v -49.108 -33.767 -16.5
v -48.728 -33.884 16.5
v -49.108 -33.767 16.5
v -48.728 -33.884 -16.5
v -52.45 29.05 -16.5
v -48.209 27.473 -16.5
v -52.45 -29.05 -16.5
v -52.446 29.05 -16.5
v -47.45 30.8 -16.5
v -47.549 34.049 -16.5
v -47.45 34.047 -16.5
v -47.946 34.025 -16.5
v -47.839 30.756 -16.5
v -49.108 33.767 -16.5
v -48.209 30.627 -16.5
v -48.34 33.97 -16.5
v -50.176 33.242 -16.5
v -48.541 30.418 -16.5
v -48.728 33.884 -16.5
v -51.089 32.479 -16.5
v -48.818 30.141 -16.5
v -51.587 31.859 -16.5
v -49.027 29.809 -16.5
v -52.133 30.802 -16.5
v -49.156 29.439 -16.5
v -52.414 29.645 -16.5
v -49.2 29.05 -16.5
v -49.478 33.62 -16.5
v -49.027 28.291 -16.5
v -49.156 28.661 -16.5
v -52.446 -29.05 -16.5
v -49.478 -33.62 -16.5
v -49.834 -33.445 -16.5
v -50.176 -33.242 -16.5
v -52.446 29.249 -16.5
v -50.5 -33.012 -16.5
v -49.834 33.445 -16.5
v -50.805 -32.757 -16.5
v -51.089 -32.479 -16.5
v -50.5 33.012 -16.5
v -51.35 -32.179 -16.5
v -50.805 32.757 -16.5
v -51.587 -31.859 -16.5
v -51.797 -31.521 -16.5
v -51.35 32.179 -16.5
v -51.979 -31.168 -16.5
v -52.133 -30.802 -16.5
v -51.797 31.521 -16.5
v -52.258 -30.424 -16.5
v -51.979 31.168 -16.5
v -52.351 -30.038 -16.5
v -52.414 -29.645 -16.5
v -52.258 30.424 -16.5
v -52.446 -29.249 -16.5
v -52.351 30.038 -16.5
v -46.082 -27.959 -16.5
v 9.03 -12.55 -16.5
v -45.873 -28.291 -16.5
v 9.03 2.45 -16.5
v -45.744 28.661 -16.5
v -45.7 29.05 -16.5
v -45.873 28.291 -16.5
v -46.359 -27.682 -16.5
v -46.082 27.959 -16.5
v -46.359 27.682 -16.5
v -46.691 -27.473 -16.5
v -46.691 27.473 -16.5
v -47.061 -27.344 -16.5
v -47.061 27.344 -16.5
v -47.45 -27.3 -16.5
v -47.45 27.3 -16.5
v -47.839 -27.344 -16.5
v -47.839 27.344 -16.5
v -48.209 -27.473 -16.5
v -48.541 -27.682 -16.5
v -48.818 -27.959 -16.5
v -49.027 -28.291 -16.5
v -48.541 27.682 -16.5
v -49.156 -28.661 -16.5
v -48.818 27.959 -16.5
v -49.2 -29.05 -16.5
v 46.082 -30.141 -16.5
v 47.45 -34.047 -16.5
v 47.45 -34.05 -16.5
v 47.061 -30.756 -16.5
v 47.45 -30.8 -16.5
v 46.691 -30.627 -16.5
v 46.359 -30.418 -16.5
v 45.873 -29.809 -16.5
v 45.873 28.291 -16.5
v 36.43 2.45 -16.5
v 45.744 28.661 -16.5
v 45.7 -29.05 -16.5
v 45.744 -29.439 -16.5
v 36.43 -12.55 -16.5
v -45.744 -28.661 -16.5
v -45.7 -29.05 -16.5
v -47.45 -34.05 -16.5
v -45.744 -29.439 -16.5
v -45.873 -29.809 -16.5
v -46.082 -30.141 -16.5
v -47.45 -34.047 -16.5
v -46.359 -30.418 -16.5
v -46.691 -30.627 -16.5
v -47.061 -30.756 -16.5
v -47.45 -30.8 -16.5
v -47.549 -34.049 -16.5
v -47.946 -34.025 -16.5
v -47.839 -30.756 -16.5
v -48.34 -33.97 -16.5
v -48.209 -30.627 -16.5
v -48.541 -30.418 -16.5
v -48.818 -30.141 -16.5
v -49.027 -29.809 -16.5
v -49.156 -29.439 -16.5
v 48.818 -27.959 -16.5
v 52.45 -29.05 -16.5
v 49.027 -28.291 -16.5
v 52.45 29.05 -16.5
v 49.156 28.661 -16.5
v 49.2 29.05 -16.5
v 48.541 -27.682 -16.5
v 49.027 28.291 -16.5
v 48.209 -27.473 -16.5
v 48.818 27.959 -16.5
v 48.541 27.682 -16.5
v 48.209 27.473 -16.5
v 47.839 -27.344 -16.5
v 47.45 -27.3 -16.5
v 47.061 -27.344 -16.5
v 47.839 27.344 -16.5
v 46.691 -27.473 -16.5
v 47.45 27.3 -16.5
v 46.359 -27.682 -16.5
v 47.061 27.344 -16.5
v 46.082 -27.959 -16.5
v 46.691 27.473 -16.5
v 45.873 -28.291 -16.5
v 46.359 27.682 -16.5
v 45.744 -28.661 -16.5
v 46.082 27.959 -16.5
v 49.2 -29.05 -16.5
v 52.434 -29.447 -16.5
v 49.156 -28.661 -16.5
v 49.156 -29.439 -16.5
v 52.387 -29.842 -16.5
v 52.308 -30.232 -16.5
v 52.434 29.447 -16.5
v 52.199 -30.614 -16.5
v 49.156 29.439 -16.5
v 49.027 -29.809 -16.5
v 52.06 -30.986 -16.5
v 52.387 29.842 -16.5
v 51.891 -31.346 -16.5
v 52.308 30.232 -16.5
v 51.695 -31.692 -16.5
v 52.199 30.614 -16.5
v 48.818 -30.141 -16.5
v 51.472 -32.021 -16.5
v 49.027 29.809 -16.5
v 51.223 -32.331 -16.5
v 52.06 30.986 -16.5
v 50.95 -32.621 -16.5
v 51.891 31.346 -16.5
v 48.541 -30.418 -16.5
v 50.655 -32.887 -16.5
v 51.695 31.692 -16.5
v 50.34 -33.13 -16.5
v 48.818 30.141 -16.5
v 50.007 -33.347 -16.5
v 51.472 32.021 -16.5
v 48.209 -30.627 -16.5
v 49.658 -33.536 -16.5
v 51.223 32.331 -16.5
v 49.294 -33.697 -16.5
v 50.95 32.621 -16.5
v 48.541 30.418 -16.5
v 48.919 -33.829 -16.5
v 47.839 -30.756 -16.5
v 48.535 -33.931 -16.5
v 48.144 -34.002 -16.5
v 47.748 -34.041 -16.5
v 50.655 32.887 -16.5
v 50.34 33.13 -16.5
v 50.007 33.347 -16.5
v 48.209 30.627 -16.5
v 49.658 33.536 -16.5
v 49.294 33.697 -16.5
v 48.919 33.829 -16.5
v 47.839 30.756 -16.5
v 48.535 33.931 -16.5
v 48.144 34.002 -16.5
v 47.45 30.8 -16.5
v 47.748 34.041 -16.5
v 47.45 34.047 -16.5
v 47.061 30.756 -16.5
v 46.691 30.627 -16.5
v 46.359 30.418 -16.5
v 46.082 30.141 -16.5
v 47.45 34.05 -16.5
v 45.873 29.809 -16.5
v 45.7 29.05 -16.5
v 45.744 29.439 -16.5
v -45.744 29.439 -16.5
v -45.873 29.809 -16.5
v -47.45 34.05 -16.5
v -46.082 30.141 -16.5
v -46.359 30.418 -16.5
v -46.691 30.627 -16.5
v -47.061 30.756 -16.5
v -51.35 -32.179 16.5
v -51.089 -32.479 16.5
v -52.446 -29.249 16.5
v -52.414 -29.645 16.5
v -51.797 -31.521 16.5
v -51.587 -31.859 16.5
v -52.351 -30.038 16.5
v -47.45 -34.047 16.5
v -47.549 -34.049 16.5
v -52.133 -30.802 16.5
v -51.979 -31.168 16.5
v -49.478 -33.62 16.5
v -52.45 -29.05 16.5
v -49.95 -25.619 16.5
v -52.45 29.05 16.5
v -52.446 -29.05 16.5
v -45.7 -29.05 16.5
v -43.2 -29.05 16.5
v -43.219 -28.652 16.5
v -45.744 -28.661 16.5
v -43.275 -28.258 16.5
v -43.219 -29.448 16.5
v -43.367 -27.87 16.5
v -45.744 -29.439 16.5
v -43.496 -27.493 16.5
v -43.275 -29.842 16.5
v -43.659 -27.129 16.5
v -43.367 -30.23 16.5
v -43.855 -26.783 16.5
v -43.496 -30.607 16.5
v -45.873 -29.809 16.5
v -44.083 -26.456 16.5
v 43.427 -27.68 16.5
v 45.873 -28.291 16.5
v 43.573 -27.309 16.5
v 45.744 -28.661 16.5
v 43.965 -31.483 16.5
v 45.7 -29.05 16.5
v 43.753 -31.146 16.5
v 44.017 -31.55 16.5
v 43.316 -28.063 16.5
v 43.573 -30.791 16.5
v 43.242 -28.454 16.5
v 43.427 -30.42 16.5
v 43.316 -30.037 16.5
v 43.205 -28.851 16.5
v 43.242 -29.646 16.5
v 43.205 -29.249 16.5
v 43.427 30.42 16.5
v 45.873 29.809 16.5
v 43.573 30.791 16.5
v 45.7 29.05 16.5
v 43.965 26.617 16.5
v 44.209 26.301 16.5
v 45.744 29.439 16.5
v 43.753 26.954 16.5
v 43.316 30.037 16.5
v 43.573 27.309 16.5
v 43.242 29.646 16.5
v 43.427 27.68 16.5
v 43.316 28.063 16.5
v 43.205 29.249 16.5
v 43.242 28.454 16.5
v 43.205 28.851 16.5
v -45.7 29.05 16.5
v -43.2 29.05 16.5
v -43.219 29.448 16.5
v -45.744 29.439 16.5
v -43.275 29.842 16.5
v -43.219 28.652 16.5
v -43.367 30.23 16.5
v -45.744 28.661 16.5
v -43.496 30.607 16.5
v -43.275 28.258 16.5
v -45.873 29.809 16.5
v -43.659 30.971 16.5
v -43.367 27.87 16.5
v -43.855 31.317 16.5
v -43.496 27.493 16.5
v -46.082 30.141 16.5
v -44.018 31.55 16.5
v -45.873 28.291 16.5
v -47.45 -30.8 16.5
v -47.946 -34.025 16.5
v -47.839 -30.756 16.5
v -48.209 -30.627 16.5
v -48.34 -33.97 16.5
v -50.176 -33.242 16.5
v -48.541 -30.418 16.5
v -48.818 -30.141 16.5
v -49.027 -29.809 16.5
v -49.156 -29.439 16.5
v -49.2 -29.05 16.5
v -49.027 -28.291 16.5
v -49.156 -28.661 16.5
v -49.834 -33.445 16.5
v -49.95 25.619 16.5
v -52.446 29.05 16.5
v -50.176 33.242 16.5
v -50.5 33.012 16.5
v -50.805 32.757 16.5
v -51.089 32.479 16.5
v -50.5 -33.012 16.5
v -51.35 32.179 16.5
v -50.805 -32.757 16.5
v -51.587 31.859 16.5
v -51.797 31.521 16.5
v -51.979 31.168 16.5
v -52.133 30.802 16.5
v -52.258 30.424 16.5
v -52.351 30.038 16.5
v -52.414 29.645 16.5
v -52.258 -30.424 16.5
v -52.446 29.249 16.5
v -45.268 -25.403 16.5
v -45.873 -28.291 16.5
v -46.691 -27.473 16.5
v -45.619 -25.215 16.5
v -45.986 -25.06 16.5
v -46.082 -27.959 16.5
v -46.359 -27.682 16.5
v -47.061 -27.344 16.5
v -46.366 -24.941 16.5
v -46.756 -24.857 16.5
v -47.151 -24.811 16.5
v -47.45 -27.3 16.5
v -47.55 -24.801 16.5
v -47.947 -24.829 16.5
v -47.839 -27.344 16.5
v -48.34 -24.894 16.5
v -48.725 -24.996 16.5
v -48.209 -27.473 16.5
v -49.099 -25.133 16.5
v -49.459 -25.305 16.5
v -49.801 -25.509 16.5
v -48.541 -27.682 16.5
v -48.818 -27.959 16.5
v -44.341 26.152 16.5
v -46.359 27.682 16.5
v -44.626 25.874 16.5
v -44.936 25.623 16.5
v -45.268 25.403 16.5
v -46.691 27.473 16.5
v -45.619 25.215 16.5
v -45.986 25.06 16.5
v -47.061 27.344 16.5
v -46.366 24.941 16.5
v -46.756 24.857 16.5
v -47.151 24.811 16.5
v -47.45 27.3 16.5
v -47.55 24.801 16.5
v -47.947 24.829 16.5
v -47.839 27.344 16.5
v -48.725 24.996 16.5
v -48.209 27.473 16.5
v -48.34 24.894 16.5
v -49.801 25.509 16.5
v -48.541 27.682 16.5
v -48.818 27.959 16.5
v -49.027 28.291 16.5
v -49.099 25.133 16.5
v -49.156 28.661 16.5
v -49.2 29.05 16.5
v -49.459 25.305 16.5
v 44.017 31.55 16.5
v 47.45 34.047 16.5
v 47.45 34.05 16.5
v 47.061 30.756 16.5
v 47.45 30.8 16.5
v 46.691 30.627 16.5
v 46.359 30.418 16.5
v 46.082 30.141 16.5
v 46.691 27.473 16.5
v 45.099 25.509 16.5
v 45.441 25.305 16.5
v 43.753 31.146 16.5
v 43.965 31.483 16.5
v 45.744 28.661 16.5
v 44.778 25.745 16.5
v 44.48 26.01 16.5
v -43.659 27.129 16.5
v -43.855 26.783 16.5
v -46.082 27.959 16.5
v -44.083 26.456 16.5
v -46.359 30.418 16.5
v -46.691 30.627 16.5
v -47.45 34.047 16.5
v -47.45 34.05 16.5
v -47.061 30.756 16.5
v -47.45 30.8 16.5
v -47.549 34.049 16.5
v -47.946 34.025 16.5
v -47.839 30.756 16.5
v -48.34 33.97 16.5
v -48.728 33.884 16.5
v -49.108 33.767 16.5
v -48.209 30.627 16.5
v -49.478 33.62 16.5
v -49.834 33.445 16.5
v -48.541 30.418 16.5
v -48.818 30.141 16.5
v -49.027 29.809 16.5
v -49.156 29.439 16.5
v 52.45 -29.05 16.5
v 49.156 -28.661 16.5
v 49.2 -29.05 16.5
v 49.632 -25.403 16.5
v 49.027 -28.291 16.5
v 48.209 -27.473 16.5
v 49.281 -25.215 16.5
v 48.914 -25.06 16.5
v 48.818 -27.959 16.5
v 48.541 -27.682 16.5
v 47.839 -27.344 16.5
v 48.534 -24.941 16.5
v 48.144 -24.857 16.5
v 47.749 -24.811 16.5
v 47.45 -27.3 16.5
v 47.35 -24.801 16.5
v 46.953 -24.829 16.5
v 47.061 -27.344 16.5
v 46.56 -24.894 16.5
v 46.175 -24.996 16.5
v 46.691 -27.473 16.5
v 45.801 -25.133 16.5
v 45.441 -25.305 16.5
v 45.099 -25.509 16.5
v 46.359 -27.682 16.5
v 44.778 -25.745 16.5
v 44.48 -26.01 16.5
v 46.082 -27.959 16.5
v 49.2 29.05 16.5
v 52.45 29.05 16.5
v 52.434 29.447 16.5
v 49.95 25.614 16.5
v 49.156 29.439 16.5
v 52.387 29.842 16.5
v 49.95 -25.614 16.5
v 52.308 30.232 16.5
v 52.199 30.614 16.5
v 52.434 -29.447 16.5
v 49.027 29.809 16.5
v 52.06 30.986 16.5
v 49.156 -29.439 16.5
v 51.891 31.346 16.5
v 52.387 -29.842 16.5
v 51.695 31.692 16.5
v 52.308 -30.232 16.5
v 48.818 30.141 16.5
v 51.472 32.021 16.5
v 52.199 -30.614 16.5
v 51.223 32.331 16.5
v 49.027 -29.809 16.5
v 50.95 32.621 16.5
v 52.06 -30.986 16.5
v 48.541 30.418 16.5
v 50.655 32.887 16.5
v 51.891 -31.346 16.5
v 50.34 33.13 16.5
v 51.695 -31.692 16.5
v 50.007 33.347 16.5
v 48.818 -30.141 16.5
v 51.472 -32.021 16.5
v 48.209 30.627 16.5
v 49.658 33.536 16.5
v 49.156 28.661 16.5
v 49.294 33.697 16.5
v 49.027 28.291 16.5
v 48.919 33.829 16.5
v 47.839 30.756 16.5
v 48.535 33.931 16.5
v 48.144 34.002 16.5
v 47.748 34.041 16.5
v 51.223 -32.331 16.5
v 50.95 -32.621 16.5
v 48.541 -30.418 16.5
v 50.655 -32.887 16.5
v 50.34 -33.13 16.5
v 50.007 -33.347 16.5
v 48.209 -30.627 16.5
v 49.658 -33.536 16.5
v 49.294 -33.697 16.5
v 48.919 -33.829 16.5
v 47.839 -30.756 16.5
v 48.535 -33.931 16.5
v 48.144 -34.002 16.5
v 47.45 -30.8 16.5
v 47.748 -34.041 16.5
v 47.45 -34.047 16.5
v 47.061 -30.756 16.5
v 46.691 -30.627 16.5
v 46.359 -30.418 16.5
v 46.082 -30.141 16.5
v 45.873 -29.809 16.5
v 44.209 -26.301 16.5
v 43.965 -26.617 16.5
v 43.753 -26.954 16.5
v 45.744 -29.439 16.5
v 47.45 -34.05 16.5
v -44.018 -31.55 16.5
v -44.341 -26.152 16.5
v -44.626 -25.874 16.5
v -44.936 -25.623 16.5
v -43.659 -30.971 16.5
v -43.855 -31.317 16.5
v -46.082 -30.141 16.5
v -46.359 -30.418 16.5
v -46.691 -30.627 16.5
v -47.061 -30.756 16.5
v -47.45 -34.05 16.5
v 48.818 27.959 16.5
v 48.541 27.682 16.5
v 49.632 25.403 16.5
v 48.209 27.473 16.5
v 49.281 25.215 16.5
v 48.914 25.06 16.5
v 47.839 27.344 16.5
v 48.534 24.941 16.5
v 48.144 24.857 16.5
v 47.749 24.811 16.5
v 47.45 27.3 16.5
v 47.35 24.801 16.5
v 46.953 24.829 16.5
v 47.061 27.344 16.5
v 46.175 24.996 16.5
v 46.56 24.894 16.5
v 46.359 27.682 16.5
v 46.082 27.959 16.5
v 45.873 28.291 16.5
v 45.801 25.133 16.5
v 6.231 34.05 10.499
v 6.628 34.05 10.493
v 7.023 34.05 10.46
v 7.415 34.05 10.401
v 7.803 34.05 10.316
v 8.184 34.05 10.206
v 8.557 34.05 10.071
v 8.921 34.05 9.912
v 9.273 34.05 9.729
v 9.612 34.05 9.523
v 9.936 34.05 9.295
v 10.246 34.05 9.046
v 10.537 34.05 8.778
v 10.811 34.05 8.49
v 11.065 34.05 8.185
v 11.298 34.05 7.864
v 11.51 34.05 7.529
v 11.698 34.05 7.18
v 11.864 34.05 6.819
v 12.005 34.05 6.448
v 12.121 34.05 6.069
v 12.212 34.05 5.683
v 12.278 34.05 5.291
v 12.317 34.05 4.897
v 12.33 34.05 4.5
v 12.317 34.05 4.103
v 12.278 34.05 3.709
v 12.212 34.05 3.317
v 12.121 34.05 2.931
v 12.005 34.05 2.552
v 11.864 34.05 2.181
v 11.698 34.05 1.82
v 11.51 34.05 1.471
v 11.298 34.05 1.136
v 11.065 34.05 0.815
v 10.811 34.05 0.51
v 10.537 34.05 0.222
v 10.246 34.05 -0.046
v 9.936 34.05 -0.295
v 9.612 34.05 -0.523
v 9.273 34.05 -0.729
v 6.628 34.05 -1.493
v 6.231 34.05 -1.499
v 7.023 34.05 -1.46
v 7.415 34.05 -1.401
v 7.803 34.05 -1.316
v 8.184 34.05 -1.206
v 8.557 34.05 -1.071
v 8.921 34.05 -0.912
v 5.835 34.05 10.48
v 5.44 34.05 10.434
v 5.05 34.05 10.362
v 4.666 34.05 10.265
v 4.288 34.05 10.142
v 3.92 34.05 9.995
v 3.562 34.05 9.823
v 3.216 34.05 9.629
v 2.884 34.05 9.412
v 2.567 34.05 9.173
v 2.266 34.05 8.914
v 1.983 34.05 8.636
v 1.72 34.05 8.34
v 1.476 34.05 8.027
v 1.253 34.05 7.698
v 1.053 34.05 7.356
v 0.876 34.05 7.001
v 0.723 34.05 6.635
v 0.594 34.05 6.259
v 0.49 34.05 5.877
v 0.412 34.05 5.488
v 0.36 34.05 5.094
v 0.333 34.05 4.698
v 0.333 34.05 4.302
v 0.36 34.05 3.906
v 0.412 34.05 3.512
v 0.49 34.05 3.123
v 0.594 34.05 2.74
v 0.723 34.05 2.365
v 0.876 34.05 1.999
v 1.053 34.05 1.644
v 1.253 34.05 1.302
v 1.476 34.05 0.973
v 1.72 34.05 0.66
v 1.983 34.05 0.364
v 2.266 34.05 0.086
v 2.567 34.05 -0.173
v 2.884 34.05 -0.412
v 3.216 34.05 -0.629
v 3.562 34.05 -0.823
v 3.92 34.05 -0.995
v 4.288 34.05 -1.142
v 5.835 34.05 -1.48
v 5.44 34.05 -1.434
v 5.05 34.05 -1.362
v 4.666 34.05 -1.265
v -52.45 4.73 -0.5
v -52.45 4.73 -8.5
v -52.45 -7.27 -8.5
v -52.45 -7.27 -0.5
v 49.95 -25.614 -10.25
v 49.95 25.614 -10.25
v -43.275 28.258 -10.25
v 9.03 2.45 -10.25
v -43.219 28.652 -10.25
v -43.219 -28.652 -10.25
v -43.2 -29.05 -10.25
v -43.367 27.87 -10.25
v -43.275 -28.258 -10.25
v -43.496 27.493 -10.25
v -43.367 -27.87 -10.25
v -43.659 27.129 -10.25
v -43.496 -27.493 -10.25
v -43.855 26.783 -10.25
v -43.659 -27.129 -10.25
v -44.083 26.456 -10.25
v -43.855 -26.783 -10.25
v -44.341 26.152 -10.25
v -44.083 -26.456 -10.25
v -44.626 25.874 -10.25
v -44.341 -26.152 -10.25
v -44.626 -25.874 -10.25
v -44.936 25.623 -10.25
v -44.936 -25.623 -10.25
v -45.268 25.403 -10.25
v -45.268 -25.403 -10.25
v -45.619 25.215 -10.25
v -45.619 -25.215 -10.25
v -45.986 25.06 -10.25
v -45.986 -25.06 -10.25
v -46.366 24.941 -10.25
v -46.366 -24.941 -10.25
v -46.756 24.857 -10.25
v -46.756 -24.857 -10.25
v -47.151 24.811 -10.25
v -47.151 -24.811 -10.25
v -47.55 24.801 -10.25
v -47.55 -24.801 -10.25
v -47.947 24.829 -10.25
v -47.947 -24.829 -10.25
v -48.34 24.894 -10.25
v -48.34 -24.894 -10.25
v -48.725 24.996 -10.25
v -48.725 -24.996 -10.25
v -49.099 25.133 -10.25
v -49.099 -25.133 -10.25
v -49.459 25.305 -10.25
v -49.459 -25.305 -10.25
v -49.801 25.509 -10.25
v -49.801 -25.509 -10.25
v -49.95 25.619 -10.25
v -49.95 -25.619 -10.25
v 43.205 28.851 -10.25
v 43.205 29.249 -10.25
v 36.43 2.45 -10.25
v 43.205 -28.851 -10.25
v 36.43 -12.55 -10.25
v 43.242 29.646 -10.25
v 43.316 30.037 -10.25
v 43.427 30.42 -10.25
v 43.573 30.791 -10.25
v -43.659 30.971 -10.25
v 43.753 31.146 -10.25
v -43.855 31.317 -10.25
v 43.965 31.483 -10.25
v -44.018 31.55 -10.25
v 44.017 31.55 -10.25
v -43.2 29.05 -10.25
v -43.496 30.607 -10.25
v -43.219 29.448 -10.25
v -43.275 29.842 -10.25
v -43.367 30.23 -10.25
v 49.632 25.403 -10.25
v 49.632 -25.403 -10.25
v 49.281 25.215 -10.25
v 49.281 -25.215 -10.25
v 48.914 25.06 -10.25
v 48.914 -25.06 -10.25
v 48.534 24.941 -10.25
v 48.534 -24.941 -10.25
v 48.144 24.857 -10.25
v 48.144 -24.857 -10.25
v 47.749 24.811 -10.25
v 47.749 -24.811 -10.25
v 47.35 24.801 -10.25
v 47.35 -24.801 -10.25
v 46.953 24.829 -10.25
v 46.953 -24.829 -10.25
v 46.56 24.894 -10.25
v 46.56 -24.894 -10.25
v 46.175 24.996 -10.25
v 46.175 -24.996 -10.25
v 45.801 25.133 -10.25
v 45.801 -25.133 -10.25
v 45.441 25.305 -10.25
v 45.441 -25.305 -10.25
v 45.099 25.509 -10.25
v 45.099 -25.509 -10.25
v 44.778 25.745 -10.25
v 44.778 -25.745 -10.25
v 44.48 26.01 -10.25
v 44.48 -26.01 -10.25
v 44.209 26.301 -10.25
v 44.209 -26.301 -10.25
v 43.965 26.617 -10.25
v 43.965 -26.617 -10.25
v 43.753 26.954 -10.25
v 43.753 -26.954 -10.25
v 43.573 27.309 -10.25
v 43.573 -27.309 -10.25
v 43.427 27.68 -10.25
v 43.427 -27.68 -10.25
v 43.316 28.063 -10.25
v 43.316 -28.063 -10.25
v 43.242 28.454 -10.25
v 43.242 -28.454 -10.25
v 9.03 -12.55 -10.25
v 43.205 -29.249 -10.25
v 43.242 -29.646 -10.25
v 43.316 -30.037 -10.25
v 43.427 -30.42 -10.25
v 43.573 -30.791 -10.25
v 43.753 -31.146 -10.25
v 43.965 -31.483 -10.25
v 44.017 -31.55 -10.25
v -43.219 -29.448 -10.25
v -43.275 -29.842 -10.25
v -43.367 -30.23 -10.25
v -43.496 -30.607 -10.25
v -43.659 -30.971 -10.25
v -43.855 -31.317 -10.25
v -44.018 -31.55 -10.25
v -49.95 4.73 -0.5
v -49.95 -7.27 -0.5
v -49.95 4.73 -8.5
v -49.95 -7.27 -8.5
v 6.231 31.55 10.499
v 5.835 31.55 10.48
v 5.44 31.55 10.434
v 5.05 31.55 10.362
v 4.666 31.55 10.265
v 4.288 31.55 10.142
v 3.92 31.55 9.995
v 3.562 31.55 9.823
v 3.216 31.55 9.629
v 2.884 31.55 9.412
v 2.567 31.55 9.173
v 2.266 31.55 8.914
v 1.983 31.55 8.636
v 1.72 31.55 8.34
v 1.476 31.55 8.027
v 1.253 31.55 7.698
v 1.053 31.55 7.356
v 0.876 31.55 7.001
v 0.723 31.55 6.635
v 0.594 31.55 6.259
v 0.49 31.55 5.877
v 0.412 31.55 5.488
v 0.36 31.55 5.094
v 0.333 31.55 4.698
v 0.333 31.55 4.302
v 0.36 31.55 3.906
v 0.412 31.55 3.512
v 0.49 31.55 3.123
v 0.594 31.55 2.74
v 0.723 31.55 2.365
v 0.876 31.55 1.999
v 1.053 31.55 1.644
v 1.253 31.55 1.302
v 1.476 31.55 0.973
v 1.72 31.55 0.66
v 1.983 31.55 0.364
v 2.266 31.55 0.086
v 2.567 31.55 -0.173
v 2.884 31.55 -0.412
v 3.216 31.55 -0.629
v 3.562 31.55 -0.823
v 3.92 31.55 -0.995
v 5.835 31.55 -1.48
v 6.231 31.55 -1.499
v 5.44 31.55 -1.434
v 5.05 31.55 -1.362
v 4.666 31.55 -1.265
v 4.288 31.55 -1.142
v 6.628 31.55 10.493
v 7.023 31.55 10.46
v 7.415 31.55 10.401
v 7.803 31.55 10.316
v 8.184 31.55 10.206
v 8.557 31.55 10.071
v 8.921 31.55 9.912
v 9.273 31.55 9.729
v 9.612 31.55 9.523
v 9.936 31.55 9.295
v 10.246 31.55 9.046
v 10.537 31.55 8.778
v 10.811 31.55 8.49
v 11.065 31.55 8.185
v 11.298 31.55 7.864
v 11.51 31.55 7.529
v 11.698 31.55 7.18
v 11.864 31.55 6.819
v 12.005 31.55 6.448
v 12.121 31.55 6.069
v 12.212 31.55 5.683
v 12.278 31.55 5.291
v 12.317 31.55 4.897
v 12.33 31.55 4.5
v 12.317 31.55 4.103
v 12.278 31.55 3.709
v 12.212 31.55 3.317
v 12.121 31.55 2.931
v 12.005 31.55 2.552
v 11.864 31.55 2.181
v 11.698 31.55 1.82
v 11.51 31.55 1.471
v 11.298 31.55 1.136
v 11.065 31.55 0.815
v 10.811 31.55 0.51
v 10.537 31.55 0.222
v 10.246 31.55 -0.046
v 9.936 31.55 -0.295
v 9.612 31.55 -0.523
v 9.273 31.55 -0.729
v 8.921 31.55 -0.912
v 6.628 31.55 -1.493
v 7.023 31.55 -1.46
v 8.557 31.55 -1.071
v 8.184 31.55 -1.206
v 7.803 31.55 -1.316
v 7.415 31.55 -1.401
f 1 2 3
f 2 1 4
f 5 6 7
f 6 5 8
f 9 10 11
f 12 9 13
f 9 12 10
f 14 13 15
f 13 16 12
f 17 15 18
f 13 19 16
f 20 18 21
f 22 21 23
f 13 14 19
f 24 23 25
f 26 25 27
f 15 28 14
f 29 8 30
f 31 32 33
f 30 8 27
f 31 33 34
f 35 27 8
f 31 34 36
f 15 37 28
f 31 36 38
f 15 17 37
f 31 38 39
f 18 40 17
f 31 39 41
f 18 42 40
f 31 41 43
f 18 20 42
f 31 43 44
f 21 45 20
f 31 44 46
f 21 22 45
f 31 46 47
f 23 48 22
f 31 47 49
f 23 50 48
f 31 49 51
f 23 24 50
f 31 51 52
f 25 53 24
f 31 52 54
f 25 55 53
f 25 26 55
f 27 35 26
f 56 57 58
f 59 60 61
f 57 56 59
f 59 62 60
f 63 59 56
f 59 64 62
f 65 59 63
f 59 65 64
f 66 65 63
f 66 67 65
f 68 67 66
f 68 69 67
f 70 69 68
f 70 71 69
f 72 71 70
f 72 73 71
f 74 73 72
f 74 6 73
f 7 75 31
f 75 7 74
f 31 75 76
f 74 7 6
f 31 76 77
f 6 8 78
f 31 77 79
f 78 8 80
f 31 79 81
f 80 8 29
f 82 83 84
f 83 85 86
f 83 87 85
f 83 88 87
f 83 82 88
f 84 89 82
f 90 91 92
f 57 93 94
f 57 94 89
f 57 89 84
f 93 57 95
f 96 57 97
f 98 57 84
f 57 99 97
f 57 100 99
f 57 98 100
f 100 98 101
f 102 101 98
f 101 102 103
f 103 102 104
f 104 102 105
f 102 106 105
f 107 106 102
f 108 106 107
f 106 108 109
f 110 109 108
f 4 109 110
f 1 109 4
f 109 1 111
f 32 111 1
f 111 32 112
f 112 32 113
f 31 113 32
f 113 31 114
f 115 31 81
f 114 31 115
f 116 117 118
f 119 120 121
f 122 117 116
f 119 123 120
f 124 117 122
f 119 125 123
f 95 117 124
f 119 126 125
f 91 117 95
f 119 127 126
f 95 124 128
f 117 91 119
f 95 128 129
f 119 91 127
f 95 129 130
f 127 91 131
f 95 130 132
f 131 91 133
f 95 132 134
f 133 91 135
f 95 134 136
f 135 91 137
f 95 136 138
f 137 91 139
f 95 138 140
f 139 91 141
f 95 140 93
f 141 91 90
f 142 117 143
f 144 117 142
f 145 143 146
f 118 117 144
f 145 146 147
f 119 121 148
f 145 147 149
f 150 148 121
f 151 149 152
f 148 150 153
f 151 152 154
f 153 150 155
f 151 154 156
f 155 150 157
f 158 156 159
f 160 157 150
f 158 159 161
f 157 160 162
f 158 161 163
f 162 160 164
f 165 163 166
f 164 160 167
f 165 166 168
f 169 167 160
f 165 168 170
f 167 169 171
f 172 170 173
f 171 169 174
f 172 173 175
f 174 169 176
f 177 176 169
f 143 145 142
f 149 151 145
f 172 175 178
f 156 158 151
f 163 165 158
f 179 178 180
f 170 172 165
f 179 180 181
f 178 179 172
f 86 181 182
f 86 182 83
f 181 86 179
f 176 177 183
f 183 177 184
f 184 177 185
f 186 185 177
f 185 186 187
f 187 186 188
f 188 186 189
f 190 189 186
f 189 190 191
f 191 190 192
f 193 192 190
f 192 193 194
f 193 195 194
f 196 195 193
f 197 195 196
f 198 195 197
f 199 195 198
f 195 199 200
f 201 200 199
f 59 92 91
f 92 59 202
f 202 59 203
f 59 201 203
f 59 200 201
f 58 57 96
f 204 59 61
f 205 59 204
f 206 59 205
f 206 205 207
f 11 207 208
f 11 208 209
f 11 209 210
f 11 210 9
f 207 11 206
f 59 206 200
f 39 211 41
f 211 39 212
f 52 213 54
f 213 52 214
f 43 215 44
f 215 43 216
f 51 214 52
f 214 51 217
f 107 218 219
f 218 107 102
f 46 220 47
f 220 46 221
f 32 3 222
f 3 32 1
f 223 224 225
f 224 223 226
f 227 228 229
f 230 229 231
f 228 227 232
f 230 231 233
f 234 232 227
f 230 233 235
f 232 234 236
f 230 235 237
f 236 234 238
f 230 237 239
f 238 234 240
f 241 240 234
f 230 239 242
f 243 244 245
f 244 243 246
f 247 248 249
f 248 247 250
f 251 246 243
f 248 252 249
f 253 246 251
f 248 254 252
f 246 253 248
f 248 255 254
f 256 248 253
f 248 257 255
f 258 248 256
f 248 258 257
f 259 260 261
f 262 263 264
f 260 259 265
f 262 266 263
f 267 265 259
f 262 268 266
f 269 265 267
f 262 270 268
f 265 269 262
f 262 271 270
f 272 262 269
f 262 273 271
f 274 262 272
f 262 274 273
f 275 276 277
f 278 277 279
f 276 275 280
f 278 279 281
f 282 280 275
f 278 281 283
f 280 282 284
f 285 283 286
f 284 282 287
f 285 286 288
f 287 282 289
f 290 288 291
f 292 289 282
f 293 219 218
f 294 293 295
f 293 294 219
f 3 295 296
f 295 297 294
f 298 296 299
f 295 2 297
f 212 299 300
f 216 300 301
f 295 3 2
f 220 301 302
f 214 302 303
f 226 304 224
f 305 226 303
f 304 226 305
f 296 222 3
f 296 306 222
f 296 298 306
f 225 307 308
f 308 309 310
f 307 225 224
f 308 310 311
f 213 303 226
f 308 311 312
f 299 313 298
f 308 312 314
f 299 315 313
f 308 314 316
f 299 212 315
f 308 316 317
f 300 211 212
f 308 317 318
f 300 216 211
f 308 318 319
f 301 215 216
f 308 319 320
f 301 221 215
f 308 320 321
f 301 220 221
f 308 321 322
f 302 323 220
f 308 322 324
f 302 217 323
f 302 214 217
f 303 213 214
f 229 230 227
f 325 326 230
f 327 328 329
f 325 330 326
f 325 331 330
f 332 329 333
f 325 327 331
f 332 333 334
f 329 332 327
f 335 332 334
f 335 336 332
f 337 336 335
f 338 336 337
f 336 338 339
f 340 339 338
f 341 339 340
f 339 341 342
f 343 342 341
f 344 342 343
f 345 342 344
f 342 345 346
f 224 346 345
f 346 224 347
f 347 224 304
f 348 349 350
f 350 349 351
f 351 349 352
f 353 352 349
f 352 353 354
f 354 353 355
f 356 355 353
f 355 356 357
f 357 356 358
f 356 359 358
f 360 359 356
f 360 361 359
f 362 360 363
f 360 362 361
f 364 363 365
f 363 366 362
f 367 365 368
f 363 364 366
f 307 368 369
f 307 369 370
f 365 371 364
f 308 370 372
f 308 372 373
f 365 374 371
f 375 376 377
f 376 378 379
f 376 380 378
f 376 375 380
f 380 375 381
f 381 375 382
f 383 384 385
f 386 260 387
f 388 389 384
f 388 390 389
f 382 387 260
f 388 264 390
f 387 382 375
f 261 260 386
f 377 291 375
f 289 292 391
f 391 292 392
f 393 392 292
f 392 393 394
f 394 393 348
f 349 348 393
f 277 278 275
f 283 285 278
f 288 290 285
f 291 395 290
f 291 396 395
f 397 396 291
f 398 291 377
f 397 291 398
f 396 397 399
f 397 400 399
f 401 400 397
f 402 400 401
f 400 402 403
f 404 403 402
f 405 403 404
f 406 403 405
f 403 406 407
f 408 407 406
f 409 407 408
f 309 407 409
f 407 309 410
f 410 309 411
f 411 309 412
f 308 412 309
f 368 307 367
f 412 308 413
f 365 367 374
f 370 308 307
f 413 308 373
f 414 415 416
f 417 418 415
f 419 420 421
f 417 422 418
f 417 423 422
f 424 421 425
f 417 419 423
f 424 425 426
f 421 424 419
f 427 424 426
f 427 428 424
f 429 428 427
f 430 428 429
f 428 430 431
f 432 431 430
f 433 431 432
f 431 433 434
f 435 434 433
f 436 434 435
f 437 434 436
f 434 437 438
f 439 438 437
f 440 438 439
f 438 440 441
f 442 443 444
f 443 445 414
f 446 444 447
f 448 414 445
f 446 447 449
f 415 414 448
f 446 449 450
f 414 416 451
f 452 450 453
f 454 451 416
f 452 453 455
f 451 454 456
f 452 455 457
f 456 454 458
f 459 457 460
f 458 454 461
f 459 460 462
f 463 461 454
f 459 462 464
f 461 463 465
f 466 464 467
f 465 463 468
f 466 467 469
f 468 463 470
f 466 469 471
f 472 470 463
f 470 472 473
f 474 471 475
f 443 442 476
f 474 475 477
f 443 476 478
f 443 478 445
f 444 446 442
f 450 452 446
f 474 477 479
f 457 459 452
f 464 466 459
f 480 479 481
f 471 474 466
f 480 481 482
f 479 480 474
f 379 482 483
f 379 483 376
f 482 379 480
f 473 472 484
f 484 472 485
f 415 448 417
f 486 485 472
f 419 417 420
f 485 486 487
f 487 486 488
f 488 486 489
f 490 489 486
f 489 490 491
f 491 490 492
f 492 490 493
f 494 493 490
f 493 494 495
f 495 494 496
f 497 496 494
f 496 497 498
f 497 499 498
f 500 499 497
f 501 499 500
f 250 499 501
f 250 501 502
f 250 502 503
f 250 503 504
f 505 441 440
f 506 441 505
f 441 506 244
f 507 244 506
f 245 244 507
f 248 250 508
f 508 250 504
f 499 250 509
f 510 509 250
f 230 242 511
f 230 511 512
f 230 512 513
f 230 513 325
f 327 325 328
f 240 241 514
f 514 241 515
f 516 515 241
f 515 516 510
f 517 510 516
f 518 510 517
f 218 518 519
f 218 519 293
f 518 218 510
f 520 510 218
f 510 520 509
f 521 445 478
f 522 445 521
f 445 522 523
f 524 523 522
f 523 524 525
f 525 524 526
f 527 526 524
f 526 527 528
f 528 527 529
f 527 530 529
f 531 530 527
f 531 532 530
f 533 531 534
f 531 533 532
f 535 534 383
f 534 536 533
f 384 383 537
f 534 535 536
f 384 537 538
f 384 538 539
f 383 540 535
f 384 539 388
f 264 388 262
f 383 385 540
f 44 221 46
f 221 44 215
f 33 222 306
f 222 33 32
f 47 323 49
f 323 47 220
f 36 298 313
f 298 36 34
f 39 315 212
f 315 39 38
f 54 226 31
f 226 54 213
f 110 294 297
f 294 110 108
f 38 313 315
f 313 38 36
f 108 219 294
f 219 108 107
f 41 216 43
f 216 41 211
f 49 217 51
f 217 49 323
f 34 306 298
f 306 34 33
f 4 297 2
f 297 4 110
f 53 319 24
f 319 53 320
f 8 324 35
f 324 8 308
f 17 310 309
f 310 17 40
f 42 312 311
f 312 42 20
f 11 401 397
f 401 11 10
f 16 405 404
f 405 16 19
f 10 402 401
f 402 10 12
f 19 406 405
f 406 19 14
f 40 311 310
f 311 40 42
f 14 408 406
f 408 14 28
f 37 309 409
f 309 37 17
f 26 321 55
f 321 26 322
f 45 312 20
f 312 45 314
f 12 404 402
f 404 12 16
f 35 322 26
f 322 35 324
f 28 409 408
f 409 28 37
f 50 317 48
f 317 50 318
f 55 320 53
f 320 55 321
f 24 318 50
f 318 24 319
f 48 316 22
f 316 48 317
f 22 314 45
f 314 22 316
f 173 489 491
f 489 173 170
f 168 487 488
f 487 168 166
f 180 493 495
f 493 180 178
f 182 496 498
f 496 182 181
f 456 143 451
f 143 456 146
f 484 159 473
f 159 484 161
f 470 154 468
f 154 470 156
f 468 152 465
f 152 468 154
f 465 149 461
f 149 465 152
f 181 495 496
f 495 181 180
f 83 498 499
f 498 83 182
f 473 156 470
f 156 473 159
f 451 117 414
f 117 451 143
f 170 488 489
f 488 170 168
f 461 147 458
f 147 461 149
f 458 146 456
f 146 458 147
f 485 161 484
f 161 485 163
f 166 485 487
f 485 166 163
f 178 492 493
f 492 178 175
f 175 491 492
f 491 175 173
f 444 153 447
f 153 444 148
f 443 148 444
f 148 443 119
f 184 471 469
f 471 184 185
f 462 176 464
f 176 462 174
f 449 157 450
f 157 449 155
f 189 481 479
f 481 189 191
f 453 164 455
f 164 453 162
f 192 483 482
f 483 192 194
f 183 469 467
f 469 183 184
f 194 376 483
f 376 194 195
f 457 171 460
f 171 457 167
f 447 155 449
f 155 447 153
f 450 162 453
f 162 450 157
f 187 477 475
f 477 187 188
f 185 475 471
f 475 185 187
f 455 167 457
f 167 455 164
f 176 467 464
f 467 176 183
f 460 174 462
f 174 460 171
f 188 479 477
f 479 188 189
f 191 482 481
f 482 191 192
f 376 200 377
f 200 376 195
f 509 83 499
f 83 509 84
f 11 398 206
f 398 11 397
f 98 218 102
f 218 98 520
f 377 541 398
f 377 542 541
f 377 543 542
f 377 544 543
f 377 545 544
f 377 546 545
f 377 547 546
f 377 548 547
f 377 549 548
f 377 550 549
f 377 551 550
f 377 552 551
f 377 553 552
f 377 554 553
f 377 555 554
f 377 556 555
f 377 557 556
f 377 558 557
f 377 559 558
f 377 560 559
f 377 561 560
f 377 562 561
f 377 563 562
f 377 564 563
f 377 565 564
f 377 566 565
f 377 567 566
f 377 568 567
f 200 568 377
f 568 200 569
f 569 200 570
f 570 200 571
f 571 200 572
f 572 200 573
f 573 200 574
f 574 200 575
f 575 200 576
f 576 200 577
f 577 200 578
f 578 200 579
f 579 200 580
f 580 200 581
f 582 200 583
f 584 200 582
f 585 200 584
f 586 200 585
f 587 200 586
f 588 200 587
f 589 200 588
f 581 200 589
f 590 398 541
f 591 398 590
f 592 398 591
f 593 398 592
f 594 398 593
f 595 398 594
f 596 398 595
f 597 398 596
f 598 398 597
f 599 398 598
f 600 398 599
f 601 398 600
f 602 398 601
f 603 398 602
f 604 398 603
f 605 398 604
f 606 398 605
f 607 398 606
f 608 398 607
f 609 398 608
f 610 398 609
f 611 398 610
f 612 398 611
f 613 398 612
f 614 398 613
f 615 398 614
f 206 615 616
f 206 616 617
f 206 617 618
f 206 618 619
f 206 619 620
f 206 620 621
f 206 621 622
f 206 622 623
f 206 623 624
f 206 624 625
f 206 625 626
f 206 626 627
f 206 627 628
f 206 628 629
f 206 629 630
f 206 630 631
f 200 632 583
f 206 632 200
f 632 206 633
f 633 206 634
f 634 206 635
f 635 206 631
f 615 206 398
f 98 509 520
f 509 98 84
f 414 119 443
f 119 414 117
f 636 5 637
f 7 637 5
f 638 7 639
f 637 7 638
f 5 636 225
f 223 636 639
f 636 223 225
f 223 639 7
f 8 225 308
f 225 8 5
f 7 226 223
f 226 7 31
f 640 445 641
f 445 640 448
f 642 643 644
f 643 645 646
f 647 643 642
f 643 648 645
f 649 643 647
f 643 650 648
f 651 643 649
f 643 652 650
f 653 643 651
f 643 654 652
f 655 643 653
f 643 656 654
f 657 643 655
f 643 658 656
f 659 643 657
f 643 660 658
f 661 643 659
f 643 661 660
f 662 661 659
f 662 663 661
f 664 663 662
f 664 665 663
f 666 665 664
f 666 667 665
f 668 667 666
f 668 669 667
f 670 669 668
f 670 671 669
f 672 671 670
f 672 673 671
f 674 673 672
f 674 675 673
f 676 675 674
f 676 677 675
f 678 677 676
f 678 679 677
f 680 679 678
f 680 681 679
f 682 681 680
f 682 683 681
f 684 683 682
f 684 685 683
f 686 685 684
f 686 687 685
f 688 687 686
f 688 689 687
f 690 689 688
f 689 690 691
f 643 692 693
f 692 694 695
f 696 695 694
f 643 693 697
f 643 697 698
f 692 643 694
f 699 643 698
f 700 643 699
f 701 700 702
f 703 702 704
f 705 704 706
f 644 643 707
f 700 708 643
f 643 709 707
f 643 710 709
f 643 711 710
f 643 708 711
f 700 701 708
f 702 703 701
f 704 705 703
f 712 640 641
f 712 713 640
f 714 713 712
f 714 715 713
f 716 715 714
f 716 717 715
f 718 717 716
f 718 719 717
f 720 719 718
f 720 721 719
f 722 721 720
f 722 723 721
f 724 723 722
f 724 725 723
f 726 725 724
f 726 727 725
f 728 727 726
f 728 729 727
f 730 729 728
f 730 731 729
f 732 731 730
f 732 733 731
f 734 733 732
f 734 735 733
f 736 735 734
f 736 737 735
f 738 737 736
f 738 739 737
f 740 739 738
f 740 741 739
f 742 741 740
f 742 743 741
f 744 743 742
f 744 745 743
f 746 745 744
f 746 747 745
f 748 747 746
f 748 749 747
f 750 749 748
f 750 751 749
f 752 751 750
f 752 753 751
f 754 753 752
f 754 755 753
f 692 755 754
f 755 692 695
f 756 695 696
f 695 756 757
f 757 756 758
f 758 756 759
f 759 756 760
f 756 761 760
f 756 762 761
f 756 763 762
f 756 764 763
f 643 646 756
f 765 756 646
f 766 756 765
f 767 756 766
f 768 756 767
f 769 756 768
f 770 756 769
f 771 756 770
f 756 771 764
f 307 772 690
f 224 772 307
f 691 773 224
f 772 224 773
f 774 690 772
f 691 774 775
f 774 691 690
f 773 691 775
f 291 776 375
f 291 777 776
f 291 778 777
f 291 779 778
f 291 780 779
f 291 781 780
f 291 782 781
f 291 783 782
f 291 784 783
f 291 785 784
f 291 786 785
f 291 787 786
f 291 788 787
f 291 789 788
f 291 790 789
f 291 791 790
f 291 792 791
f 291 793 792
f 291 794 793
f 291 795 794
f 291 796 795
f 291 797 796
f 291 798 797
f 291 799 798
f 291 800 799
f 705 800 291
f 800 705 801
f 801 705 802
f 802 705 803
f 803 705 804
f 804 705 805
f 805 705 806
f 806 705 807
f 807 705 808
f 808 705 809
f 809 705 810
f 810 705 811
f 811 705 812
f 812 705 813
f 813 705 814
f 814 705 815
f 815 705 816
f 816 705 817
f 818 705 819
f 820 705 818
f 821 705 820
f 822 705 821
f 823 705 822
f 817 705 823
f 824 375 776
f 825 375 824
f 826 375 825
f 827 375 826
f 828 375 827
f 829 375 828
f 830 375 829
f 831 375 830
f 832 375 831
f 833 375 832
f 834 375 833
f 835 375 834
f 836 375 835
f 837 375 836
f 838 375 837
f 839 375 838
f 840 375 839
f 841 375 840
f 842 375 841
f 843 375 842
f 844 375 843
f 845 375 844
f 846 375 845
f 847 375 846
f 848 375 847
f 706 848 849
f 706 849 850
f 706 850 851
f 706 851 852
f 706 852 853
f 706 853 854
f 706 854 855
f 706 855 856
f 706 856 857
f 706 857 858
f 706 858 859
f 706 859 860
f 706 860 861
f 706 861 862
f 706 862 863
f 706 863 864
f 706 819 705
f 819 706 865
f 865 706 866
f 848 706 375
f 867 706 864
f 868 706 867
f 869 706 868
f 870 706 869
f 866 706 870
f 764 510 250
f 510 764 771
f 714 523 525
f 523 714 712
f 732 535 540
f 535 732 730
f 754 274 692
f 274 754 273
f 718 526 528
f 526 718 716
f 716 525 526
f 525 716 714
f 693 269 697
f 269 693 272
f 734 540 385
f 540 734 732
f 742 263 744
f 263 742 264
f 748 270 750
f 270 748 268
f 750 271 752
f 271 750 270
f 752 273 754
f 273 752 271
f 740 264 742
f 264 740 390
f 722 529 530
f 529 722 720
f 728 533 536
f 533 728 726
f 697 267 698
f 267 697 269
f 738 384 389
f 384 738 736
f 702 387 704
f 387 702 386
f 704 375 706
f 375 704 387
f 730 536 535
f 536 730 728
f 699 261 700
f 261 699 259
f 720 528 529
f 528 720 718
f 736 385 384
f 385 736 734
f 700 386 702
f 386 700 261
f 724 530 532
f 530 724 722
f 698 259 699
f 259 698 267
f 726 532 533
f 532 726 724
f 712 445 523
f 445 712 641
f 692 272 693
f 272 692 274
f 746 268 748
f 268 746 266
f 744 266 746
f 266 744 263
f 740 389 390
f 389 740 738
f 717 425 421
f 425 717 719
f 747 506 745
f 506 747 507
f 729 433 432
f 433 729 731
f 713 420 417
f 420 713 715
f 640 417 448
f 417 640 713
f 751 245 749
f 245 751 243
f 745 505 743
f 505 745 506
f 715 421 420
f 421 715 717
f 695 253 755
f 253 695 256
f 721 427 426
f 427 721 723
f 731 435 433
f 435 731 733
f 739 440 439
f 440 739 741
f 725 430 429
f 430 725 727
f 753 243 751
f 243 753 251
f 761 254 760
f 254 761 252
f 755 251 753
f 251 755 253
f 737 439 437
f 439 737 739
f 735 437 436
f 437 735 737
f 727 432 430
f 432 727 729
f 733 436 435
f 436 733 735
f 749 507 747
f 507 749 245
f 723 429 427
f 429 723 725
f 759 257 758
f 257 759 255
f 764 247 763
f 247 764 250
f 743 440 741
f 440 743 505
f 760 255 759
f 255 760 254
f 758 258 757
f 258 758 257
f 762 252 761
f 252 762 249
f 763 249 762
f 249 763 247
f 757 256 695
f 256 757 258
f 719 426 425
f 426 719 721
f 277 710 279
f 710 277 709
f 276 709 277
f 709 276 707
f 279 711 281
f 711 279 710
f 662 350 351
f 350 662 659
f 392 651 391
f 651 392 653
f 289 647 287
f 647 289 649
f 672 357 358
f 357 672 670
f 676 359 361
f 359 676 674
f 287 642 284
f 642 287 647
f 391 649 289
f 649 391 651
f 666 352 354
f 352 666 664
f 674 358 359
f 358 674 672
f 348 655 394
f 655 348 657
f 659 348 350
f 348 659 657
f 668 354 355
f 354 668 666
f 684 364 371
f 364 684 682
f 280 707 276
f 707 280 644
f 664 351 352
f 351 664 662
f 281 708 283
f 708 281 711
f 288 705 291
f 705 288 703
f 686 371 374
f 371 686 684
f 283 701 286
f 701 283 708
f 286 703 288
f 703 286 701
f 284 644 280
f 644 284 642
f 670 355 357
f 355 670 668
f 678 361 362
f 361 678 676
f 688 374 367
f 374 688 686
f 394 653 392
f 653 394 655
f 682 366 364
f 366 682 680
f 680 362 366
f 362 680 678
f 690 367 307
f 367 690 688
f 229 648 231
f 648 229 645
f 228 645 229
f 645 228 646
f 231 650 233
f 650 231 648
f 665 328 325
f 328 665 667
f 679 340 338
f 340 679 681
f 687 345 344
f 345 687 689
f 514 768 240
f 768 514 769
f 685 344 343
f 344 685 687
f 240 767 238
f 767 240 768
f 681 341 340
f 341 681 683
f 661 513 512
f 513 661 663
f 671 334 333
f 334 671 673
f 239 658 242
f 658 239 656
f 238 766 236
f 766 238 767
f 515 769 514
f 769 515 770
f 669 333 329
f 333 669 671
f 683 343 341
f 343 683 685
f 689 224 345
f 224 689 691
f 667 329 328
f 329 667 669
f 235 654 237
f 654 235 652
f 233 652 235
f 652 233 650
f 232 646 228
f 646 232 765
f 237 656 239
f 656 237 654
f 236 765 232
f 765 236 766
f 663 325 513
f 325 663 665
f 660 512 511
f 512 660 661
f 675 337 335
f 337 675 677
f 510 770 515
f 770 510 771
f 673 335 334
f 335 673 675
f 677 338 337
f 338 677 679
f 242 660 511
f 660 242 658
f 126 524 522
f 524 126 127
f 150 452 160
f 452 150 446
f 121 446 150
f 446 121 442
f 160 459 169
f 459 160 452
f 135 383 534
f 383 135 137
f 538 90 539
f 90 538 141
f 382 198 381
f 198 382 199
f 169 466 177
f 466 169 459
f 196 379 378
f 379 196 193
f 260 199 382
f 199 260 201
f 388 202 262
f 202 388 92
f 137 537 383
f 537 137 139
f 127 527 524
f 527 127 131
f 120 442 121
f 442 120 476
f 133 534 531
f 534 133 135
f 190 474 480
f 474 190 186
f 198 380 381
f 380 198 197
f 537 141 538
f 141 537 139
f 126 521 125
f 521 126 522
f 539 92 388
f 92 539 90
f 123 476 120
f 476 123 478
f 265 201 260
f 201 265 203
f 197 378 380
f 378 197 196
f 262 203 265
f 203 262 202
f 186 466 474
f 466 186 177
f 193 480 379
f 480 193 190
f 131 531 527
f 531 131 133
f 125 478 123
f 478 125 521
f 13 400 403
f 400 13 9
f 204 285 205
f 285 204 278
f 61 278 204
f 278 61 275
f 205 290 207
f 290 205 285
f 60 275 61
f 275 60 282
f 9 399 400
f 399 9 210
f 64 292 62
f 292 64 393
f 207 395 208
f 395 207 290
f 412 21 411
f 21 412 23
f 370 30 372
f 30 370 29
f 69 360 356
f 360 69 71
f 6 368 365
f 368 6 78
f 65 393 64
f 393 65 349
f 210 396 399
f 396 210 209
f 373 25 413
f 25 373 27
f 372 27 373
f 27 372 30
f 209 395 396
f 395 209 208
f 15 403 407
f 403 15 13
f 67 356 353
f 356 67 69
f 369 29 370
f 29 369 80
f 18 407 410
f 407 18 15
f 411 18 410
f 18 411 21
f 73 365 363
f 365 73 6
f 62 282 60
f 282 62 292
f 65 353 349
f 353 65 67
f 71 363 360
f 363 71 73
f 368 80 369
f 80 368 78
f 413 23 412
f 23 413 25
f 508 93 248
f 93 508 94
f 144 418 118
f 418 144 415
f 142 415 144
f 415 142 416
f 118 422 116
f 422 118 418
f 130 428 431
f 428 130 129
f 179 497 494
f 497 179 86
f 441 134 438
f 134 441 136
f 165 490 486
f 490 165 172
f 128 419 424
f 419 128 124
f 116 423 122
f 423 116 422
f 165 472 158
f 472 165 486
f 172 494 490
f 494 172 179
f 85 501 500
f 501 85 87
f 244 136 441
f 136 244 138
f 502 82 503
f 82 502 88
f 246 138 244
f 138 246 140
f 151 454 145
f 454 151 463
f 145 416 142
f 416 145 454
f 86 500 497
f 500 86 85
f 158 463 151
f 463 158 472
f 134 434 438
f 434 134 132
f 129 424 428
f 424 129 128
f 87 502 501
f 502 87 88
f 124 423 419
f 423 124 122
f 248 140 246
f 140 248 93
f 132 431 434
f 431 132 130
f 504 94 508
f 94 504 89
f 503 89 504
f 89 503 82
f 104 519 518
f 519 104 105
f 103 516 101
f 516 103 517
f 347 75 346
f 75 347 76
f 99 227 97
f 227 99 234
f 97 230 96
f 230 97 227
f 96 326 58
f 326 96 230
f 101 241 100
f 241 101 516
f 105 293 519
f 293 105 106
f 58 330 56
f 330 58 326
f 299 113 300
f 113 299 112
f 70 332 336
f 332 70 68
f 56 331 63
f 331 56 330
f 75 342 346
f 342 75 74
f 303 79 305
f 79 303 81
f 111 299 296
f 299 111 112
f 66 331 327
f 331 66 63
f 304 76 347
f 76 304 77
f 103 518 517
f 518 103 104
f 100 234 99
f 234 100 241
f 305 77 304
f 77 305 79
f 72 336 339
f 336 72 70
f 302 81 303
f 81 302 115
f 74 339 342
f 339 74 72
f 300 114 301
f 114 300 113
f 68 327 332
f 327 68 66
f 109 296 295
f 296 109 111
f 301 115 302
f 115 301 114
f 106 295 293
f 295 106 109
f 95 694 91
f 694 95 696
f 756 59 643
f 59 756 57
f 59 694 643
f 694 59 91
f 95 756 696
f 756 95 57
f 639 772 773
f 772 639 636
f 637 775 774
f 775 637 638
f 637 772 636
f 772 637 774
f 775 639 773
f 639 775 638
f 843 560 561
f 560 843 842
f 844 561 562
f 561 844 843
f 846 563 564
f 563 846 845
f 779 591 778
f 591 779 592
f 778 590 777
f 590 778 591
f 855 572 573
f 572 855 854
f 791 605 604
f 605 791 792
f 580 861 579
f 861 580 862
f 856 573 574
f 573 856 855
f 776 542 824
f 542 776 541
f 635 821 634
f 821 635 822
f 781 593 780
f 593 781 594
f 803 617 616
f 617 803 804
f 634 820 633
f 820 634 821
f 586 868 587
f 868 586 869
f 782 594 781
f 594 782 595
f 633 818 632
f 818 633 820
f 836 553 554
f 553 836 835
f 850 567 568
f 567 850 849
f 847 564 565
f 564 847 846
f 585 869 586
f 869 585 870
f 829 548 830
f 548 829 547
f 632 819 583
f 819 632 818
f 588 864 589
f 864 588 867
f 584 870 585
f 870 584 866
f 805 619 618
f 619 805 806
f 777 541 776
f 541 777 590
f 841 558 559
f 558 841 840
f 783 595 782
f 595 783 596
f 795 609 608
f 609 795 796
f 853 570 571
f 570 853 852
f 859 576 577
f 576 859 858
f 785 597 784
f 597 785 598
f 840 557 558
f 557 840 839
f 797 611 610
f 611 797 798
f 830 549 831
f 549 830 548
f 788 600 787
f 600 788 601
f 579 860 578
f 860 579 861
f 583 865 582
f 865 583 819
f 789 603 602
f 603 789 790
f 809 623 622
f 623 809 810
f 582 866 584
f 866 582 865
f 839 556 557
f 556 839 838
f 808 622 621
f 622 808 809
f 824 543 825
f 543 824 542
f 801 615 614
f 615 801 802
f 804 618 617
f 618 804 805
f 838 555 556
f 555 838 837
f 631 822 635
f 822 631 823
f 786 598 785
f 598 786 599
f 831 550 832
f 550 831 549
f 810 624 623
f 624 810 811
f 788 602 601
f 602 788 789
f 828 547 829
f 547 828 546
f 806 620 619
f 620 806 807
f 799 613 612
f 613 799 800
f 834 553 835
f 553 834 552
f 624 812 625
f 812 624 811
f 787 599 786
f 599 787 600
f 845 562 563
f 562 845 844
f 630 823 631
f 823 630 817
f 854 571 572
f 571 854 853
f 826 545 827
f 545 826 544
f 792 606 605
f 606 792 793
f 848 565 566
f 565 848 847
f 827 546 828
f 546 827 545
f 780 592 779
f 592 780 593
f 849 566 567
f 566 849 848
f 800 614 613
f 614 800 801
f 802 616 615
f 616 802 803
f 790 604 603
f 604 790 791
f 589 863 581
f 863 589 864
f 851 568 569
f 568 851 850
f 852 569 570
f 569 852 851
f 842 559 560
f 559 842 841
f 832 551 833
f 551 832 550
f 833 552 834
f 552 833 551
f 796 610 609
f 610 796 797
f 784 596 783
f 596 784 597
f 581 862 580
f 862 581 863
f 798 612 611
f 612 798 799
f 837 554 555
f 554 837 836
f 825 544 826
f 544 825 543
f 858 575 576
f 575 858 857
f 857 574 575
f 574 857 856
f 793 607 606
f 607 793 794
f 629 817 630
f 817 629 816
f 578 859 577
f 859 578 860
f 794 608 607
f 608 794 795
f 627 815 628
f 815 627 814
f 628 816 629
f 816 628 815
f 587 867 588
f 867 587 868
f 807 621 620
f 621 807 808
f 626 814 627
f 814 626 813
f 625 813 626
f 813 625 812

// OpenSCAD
// file: knurlpocket.scad
//Module to create a knurl pocket suitable for Heat-set inserts

// Articles about knurl insert
//https://hackaday.com/2019/02/28/threading-3d-printed-parts-how-to-use-heat-set-inserts/
//https://clevercreations.org/brass-threaded-inserts-plastic-3d-printing/

//Global vars
$fa = 1;
$fs = 0.2;
knurl_radius = 2.5;
knurl_wall = 2.5;


module m3knurl_ring(knurl_depth = 5)
{

    difference() {   
        cylinder(h=knurl_depth, r=knurl_radius+knurl_wall,center=true);
        m3knurl_pocket(knurl_depth = 5);
    }
    
}

module m3knurl_pocket(knurl_depth = 5)
{
 cylinder(h=knurl_depth+0.001, r=knurl_radius,center=true);
}

m3knurl_ring();
translate([20,0,0]) m3knurl_pocket();
// file: parameters.scad
// Case for Halfsize Electrocookie board
// Parameters for include to keep them same for top and bottom.
// Provide parameters for different electrocookie boards
// Default to halfsize.
// All sizes in mm (even though it is mostly inch based board)

//TODO, this should be modulerized
//For now keep the vars in an include file

//================Customization variables=========================
//Define type of electrocookie board
// full, half, mini
board_version = "half";

// Row where the first pin of the display is placed
// Comment out if no display
// Display type is 0.96" OLED
display_pin1_row = 23;

// Row where the first pin of the phone jack is placed
// Comment out if no phone jack
// Assume using column A
jack_pin1_row = 16;

// Column where the first pin of the ESP32 board is placed
// Comment out if no ESP32
// ESP32 board is DEVKIT, 30pin
ESP32_pin1_column = "B";
//=================End of customization===========================



//Global rendering vars
$fa = 1;
$fs = 0.4;

// board_length
board_length =
(board_version == "full") ? 172.7:
(board_version == "half") ? 88.9:
(board_version == "mini") ? 50.8:88.9;

// board_length
board_width =
(board_version == "full") ? 52.1:
(board_version == "half") ? 52.1:
(board_version == "mini") ? 38.1:52.1;

//m3_hole_distance
m3_hole_distance = 
(board_version == "full") ? 78.7:
(board_version == "half") ? 73.7:
(board_version == "mini") ? 40.6:73.7;

//row_count
row_count =
(board_version == "full") ? 63:
(board_version == "half") ? 30:
(board_version == "mini") ? 17:30;

//Distance from edge to first row
first_row =
(board_version == "full") ? 7.65:
(board_version == "half") ? 7.6:
(board_version == "mini") ? 5.1:7.6;

first_column =
(board_version == "full") ? 12:
(board_version == "half") ? 12:
(board_version == "mini") ? 5.1:12;


//Common parameters

board_buffer = 3;
wall_depth = 2.5;

row_spacing = 2.54;


box_length = board_length +4*wall_depth + 2*board_buffer;
box_width = board_width + 4*wall_depth + 2*board_buffer;
corner_radius=5;

knurl_depth = 5;

corner_screw_distance = 5;

// Custom features

// OLED display
oled_width = 27.40;
oled_display_width = oled_width;
oled_height = 28;
oled_display_height = 15;
oled_bottom_space = 8;
oled_pin1 = 10;
oled_pin_from_top = 2;

if (is_undef(display_pin1_row)) {
    echo("No display");
}
else {
    echo("display at row", display_pin1_row);
}
// main file
// Case for Electrocookie board
// Top and actual box


// TODO
// Side walls are 2.5 mm. OK but change name of params to reflect reality
// Top is 7.5 mm
//   Full 5 mm depth
//   -5mm from center, but should be 2.5 mm and then if wall is really 2.5 mm change wall depth
// With this box can be 5mm lower and USB port still fit


include <parameters.scad>
use <knurlpocket.scad>
use <MCAD/boxes.scad>

board_height = 17.25; 
air_gap = 5.75; // space above top of board
top_height = 2*wall_depth + board_height + knurl_depth + air_gap;
top_length = box_length;
top_width = box_width;
screw_radius = 1.75;
echo("topbox size:",top_length,top_width,top_height);


difference() {
union() {
difference() {
//top box walls
  //cube([top_length,top_width,top_height],center=true);
  roundedBox(size=[top_length,top_width,top_height],radius=corner_radius,sidesonly=true);
  translate([0,0,2*wall_depth])
  cube([top_length-2*wall_depth,top_width-2*wall_depth,top_height-wall_depth],center=true);
}

// screw columns
  translate([(top_length/2-corner_screw_distance),
    (top_width/2-corner_screw_distance),
    0])
    cylinder(r=screw_radius + wall_depth,h=top_height, center=true);
  translate([(top_length/2-corner_screw_distance),
    -(top_width/2-corner_screw_distance),
    0])
    cylinder(r=screw_radius + wall_depth,h=top_height, center=true);
  translate([-(top_length/2-corner_screw_distance),
    (top_width/2-corner_screw_distance),
    0])
    cylinder(r=screw_radius + wall_depth,h=top_height, center=true);
  translate([-(top_length/2-corner_screw_distance),
    -(top_width/2-corner_screw_distance),
    0])
    cylinder(r=screw_radius + wall_depth,h=top_height, center=true);
}

//screw holes
  translate([top_length/2-corner_screw_distance,
    top_width/2-corner_screw_distance,
    0])
    cylinder(r=screw_radius,h=top_height+0.01, center=true);
  translate([- (top_length/2-corner_screw_distance),
    top_width/2-corner_screw_distance,
    0])
    cylinder(r=screw_radius,h=2*top_height+0.01, center=true);
  translate([(top_length/2-corner_screw_distance),
    -(top_width/2-corner_screw_distance),
    0])
    cylinder(r=screw_radius,h=top_height+0.01, center=true);
  translate([-(top_length/2-corner_screw_distance),
    -(top_width/2-corner_screw_distance),
    0])
    cylinder(r=screw_radius,h=top_height+0.01, center=true);


// display hole if exist
    if (!is_undef(display_pin1_row)) {
        // Assume it is in column J
        oled_center_from_top = first_column+(oled_height/2-oled_pin_from_top);
        oled_top_space = oled_height - oled_display_height - oled_bottom_space;
        y_offset = oled_bottom_space - oled_top_space;
        display_center_from_top = oled_center_from_top - y_offset;
        oled_center_y = - (board_width/2 - display_center_from_top);
        // Use display_row
        oled_pin1_from_left = first_row + (display_pin1_row-1)*row_spacing;
        oled_center_from_pin1 = oled_width/2 - oled_pin1;
        oled_center_x = (oled_pin1_from_left + oled_center_from_pin1) - board_length/2;
        echo("OLED center",oled_center_x, oled_center_y);
        echo("OLED left edge from box edge",box_length/2 + oled_center_x - oled_display_width/2);
        echo("OLED bottom edge from box edge",box_width/2 - oled_center_y - oled_display_height/2);
        translate([oled_center_x, oled_center_y, 0])
            cube([oled_display_width,oled_display_height,top_height+1],center=true);                
    }

// USB hole if ESP32 exist
    if (!is_undef(ESP32_pin1_column)) {
        
        usb_width = 12;
        usb_height = 8;
        usb_center_from_bottom = 21;

        // center_z is 21mm from bottom plate or top of this print
        center_z = top_height / 2 - usb_center_from_bottom;
        // If Column A, half row above center Y, if B half row below center Y
        center_y = (ESP32_pin1_column == "A") ? row_spacing/2 : -row_spacing/2;
        translate([-top_length/2, center_y, center_z])
            cube([4*wall_depth, usb_width,usb_height],center=true);  
        echo("Looking at outside, plate at bottom");
        echo("usb right edge from box edge",top_width/2-center_y-usb_width/2);
        echo("usb bottom edge from bottom edge",usb_center_from_bottom-usb_height/2);
        
    }
// Jack hole if exist
    if (!is_undef(jack_pin1_row)) {
        
        jack_radius = 6;
        jack_center_from_bottom = 12;

        // center_z is 12mm from bottom plate or top of this print
        center_z = top_height / 2 - jack_center_from_bottom;
        // center_x is pin1 + 2 row_spacings
        // add 1, 2 more -1 as as first pin is 1 not 0
        board_x = first_row + (jack_pin1_row + 1) * row_spacing;
        center_x = board_x - board_length/2;
        translate([center_x, top_width/2, center_z])
            rotate([90,0,0])
            cylinder(r=jack_radius,h=4*wall_depth, center=true);  
        echo("Looking at outside, plate at bottom");
        echo("jack center from box right edge",top_length/2-center_x);
        echo("jack center from bottom edge",jack_center_from_bottom);
        
    }
}

//Size of electrocookie board for testing
//Do not include in design
//roundedBox(size=[board_length,board_width,1],radius=5.1,sidesonly=true);
